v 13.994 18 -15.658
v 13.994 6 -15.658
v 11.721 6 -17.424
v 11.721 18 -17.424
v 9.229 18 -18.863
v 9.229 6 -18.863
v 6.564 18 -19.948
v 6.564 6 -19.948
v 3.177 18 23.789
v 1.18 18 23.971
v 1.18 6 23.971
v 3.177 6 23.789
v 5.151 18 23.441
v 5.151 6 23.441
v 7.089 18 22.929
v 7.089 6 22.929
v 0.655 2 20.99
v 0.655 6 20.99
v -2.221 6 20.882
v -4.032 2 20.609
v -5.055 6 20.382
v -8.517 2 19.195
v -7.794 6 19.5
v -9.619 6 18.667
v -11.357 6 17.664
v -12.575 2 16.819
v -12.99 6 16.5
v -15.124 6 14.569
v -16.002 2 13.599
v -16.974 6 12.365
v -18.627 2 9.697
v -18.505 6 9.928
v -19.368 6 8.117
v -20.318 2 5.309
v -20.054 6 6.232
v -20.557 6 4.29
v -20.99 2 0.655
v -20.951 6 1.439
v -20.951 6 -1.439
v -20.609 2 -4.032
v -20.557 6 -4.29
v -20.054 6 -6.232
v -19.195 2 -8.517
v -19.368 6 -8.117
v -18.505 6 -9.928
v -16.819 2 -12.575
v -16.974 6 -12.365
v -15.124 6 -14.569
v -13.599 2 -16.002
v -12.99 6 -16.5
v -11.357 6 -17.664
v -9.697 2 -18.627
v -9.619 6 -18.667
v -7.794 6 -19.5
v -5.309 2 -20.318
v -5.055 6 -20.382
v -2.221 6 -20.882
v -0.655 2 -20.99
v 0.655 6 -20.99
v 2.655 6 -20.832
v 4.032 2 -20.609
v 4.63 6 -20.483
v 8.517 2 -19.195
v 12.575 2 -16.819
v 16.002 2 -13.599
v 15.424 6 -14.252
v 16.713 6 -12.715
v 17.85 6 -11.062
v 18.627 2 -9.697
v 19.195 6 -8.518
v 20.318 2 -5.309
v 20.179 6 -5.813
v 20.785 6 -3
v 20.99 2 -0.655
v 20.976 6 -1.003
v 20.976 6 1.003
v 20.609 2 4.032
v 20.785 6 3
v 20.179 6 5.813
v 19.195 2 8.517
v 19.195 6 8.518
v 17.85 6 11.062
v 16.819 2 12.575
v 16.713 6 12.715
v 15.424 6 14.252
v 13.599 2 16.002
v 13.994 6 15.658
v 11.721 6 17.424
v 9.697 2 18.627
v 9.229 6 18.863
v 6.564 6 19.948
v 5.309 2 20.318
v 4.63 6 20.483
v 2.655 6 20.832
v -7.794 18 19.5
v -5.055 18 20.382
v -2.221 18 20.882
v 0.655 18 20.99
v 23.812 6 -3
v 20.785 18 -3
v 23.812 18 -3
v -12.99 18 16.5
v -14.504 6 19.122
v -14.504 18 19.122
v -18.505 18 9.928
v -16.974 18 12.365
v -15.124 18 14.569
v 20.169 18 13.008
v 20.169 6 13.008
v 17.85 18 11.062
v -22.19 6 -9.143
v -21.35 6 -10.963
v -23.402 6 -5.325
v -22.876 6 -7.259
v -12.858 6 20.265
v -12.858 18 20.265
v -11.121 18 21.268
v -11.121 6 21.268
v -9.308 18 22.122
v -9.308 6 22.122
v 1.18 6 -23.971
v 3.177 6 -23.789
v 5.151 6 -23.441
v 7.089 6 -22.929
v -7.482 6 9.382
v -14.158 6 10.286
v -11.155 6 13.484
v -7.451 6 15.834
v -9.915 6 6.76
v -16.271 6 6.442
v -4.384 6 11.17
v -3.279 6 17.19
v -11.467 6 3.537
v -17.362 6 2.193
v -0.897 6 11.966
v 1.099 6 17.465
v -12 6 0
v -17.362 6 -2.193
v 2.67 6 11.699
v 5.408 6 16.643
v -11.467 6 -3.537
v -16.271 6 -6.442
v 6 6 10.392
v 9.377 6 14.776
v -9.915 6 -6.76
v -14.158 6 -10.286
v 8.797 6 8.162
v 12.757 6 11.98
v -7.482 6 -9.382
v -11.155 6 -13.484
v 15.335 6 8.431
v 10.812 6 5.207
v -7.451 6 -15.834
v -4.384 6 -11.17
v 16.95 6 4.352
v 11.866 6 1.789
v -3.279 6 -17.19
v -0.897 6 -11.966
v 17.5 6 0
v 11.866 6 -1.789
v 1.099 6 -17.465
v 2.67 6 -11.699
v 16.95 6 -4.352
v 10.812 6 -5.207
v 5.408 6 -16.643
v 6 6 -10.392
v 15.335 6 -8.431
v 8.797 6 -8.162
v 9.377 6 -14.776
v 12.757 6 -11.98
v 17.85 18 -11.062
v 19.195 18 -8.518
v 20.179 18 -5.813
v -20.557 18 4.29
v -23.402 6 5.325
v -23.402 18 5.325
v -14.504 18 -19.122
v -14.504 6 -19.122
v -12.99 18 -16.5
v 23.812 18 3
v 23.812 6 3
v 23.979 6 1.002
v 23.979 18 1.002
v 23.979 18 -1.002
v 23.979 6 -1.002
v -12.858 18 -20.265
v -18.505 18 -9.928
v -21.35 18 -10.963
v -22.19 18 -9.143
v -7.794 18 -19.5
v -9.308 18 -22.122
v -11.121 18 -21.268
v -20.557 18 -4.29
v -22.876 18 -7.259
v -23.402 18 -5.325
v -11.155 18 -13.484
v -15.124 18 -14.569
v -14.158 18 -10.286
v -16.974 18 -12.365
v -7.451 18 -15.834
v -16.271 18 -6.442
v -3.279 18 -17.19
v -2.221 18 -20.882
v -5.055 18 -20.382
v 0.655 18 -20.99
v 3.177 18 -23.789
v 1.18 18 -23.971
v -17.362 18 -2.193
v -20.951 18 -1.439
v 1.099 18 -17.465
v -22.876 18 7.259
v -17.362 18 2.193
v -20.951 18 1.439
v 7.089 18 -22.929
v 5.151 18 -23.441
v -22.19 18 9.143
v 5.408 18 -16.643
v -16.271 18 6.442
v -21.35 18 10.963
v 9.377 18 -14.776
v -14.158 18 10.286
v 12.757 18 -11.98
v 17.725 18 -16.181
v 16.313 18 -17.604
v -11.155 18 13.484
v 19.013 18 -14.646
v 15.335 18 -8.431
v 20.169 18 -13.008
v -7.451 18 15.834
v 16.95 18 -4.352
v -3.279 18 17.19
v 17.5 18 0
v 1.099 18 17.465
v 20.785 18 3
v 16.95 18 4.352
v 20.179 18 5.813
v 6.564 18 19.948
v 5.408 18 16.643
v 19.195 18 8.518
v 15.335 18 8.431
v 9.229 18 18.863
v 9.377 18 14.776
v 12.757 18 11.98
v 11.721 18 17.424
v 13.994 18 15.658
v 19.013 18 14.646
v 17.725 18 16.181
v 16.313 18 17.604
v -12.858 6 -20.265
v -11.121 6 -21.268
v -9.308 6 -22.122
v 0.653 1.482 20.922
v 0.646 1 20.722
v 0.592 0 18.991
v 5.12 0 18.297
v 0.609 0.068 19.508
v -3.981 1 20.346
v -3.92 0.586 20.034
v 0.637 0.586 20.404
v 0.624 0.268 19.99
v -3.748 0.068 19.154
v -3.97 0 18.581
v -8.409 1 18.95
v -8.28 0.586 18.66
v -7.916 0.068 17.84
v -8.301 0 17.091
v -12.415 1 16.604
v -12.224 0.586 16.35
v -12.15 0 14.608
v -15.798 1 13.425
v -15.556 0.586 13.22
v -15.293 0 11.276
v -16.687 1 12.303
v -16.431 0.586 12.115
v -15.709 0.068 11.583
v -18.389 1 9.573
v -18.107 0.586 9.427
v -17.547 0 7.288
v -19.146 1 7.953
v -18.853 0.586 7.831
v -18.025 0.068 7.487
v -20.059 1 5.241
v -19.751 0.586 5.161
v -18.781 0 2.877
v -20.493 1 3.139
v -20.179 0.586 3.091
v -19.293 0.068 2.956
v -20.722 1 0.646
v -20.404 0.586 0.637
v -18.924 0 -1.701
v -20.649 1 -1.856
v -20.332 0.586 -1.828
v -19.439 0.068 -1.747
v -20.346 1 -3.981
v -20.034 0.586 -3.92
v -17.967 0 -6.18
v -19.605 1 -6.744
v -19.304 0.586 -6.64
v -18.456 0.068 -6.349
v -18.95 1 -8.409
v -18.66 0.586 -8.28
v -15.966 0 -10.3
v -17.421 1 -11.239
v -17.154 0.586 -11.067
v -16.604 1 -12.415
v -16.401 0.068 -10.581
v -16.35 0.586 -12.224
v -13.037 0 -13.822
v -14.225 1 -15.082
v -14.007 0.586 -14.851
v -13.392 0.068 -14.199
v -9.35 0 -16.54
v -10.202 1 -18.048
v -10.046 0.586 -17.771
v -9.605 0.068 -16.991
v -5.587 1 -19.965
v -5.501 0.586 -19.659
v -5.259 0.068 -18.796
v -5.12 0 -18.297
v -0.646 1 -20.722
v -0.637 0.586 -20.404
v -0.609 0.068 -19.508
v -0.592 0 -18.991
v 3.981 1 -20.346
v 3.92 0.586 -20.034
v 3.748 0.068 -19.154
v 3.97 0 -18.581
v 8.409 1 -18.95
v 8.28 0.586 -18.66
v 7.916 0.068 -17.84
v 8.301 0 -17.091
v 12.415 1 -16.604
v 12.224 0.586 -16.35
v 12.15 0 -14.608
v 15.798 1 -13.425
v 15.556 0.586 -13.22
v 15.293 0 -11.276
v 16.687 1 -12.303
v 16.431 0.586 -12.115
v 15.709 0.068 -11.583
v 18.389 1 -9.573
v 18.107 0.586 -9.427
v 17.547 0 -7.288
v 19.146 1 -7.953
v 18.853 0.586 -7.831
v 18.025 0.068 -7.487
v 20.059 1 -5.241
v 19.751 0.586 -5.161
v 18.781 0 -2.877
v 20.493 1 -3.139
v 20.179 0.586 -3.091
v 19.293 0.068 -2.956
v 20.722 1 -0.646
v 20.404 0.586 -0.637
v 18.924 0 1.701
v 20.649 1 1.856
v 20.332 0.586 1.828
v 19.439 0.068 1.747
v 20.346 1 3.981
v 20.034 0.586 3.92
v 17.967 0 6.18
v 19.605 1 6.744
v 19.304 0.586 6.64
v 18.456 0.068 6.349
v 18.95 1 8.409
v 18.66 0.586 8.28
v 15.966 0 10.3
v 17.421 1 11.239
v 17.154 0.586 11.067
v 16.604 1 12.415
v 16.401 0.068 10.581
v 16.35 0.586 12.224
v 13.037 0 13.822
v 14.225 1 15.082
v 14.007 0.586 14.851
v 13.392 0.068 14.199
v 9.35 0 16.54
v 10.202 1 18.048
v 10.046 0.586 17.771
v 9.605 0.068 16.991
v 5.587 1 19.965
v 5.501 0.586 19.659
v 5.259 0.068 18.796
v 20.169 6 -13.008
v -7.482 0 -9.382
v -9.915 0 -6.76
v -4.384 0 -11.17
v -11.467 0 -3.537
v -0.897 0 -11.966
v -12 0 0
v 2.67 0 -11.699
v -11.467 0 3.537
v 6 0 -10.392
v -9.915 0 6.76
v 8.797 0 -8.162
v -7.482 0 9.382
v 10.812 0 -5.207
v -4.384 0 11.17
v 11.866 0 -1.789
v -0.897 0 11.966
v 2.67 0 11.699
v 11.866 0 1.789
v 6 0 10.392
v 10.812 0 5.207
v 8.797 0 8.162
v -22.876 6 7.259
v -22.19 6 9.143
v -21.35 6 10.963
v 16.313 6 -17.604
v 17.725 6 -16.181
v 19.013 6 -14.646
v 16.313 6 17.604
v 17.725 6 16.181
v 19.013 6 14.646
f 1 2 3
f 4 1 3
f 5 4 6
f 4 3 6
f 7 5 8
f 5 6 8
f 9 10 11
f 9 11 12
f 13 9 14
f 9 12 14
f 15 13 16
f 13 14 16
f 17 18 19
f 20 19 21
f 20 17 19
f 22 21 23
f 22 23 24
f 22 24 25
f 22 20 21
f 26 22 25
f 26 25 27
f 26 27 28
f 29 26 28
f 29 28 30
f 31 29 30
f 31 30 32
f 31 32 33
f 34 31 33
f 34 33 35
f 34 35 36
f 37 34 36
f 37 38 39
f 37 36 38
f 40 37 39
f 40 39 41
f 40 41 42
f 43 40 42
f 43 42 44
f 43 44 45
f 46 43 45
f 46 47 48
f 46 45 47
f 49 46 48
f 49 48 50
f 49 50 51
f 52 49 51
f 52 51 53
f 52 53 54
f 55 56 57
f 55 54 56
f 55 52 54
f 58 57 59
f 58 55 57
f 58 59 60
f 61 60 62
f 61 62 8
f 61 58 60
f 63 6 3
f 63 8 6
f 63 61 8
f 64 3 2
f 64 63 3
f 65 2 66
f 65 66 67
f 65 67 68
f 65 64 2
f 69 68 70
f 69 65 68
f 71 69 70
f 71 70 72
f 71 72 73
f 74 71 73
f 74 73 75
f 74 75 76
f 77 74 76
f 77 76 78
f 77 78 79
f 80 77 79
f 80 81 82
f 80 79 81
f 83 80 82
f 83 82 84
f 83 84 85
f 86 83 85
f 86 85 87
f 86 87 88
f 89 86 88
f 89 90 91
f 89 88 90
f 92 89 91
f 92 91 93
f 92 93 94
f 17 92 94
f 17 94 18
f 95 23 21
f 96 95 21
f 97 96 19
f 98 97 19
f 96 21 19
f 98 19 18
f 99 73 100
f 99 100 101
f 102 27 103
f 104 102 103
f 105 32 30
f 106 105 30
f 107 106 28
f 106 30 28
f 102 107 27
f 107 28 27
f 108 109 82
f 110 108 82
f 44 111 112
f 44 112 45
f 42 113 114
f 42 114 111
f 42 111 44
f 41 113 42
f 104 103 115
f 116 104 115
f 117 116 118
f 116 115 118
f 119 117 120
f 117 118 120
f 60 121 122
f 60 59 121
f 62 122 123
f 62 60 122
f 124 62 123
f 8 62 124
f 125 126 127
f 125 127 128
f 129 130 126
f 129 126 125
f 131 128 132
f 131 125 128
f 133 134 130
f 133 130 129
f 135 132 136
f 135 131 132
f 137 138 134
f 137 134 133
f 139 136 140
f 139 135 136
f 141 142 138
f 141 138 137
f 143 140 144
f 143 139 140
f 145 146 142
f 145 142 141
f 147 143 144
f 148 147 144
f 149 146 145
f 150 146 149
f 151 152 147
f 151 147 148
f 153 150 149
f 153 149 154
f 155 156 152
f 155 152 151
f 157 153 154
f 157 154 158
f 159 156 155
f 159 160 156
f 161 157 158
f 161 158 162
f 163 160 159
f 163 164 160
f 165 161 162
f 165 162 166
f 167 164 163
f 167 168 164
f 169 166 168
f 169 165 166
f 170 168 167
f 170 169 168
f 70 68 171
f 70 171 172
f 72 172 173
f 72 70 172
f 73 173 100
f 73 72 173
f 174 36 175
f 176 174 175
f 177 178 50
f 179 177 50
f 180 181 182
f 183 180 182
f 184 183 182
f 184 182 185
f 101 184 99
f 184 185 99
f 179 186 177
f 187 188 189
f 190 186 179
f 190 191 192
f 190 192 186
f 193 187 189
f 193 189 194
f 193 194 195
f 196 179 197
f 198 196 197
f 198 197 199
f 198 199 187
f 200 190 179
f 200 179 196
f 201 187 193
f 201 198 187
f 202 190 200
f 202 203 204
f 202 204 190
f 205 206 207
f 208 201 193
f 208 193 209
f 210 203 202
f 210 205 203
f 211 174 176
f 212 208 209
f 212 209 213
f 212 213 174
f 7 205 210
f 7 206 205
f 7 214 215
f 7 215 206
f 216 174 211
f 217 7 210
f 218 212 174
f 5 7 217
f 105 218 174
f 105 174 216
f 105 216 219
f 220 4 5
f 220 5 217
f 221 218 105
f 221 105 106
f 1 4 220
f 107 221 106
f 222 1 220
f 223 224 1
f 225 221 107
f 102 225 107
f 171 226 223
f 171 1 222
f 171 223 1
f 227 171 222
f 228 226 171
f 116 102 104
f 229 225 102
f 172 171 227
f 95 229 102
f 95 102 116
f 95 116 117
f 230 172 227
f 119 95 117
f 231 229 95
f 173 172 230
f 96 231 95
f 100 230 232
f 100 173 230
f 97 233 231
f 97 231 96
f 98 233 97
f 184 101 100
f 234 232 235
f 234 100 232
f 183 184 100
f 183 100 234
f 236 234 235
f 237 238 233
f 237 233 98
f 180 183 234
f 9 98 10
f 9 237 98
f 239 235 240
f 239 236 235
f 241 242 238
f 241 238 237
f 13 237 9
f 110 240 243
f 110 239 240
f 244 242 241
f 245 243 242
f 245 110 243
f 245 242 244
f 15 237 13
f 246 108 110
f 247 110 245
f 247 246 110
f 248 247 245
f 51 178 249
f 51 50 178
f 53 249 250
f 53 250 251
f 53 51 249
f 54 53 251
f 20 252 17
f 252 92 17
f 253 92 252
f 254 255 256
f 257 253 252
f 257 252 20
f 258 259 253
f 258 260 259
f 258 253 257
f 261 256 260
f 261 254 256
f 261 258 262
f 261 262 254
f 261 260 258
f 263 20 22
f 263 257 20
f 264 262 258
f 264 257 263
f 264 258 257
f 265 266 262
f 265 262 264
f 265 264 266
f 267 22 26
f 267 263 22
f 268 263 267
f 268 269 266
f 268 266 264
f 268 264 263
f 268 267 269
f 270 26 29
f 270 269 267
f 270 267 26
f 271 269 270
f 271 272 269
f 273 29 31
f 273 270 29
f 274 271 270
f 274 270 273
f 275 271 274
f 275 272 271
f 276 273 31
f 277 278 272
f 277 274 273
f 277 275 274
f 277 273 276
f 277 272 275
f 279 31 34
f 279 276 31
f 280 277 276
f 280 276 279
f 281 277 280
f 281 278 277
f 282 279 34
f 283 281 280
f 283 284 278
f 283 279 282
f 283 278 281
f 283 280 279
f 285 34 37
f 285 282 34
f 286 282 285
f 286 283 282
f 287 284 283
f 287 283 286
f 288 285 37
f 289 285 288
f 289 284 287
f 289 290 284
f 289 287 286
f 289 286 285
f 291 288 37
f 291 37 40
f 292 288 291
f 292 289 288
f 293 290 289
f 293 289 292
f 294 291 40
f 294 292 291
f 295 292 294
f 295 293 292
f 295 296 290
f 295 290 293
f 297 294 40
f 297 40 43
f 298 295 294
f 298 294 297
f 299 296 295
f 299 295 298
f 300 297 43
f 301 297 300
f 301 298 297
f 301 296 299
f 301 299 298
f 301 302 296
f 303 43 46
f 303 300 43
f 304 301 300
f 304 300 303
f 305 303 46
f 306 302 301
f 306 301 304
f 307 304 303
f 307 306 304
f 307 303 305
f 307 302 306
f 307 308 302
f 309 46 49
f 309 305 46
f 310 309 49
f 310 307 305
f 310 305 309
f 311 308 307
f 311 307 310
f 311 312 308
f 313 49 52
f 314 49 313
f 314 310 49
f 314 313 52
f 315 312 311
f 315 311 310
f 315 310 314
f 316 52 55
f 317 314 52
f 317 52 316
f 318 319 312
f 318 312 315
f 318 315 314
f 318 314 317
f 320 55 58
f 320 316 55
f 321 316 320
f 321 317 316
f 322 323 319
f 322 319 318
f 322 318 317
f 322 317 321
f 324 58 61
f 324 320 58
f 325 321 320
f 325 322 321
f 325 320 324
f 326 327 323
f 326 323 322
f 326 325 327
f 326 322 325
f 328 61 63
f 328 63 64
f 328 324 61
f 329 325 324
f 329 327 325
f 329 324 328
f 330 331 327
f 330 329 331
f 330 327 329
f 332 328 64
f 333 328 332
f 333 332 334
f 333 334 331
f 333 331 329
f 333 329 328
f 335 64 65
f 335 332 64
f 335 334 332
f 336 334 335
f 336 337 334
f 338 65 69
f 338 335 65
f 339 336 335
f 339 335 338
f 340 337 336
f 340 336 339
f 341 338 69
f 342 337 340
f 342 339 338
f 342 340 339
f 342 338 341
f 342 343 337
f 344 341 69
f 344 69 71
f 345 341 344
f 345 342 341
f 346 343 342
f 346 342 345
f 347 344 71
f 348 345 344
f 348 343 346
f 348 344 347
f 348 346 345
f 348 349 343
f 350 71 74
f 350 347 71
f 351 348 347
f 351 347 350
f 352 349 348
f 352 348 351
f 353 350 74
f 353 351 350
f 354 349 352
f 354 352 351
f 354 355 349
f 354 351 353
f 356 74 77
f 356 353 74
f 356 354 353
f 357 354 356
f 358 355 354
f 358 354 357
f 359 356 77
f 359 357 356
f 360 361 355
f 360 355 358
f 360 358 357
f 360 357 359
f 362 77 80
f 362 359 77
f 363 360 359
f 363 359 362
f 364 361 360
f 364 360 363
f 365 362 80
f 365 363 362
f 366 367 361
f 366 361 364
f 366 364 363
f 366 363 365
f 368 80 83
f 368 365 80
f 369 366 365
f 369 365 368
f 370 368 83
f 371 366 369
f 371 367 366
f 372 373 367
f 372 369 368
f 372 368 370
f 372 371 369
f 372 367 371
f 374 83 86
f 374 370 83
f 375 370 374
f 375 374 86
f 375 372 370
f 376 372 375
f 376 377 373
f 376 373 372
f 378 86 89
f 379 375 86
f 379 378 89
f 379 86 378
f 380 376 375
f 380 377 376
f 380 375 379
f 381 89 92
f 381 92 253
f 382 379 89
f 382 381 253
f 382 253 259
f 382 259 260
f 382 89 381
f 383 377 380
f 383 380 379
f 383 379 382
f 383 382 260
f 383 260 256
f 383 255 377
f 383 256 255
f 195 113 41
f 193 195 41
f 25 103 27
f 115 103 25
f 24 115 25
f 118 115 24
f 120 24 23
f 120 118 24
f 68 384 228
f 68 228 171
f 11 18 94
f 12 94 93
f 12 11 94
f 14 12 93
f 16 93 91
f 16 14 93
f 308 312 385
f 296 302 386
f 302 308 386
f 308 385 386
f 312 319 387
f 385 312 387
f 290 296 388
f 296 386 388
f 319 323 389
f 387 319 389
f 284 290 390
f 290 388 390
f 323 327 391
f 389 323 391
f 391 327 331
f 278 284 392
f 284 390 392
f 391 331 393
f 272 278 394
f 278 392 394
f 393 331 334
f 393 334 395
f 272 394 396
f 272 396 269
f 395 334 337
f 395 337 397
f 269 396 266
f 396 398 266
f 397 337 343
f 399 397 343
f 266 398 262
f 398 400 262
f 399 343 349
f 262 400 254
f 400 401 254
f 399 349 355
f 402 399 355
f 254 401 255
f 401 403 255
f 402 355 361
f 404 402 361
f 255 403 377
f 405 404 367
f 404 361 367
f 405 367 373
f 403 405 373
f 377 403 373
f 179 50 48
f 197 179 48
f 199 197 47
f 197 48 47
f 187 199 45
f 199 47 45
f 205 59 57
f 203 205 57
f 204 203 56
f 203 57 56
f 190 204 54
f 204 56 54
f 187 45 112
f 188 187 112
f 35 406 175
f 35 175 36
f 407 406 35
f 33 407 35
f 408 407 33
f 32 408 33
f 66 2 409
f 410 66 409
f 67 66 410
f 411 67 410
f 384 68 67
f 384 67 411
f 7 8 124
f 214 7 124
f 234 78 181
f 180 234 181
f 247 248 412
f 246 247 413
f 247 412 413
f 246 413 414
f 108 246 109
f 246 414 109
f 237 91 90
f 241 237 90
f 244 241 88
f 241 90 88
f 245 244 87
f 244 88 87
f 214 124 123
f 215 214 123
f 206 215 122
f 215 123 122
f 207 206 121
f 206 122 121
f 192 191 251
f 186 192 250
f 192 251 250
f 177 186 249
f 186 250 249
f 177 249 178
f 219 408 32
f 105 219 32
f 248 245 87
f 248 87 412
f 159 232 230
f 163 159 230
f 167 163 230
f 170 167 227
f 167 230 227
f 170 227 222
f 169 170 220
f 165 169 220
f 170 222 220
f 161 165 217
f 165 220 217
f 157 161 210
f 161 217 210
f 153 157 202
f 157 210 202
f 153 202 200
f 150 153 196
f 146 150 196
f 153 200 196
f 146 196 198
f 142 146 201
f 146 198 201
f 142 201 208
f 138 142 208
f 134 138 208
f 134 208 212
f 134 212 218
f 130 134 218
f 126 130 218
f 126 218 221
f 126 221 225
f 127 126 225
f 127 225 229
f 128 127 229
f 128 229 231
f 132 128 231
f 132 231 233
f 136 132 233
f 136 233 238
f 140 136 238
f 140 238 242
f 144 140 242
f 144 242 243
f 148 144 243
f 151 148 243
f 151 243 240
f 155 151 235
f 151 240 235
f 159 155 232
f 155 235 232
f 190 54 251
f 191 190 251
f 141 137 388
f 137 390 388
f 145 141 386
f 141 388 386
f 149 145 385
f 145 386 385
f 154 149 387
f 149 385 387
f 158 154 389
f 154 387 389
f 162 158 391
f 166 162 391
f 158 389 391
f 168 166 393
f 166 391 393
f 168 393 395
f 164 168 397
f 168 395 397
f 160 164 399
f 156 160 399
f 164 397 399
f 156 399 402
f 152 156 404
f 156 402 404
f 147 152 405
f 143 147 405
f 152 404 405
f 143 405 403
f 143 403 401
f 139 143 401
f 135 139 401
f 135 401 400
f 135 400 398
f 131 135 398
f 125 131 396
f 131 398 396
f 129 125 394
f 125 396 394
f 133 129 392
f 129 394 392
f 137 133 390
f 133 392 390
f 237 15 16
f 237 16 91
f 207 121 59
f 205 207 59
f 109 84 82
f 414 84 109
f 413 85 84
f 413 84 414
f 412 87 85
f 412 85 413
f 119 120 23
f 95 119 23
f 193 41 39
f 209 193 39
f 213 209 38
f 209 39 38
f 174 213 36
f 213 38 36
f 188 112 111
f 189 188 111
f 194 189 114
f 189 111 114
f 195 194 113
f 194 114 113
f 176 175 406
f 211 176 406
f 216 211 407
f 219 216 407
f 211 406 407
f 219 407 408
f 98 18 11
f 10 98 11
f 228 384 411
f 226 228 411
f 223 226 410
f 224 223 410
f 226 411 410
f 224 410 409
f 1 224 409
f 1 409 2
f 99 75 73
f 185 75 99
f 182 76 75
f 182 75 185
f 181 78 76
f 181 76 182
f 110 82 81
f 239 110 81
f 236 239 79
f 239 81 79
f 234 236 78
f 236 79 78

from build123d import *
from build123d.topology import SkipClean

# Parameters (mm, degrees)
SKETCH1_R           = 24
BOSS_EXTRUDE1_DEPTH = 18
HOLE2_D             = 24
HOLE2_DEPTH         = 18
HOLE2_CBORE_D       = 35
HOLE2_CBORE_DEPTH   = 12
HOLE2_TIP           = 7.210327428
CUT_EXTRUDE1_START  = -12
CUT_EXTRUDE1_DEPTH  = 12
SKETCH7_R           = 24
SKETCH7_R_2         = 21
CUT_EXTRUDE2_DEPTH  = 6
FILLET1_R           = 2


with BuildPart() as part:
    # Sketch1 → Boss-Extrude1 (new body)
    with BuildSketch(Plane(origin=(0, 0, 0), x_dir=(1, 0, 0), z_dir=(0, 1, 0))):
        with Locations(Location((0, 0, 0), (0, 0, 270))):
            Circle(SKETCH1_R)
    extrude(amount=BOSS_EXTRUDE1_DEPTH)

    # Hole2
    with Locations(Plane(origin=(0, 18, 0), x_dir=(1, 0, 0), z_dir=(0, 1, 0))):
        with Locations((0, 0)):
            CounterBoreHole(HOLE2_D / 2, HOLE2_CBORE_D / 2, HOLE2_CBORE_DEPTH, depth=HOLE2_DEPTH)
            with Locations((0, 0, -(HOLE2_DEPTH + HOLE2_TIP / 2))):  # 118° drill point
                Cone(0, HOLE2_D / 2, HOLE2_TIP, mode=Mode.SUBTRACT)

    # Sketch6 → Cut-Extrude1 (cut)
    with BuildSketch(Plane(origin=(0, 18, 0), x_dir=(1, 0, 0), z_dir=(0, 1, 0)).offset(CUT_EXTRUDE1_START)):
        with BuildLine():
            Line((20.784609691, 3), (23.8117618, 3))
            ThreePointArc((23.8117618, 3), (22.552622899, 8.20848344), (20.169230637, 13.00777212))
            Line((20.169230637, 13.00777212), (17.850297585, 11.061956252))
            ThreePointArc((17.850297585, 11.061956252), (19.733545037, 7.18242301), (20.784609691, 3))
        make_face()
        with BuildLine():
            Line((20.784609691, -3), (23.8117618, -3))
            ThreePointArc((23.8117618, -3), (22.552622899, -8.20848344), (20.169230637, -13.00777212))
            Line((20.169230637, -13.00777212), (17.850297585, -11.061956252))
            ThreePointArc((17.850297585, -11.061956252), (19.733545037, -7.18242301), (20.784609691, -3))
        make_face()
        with BuildLine():
            Line((13.993571927, -15.658222911), (16.312504978, -17.604038779))
            ThreePointArc((16.312504978, -17.604038779), (12, -20.784609691), (7.089292303, -22.9290631))
            Line((7.089292303, -22.9290631), (6.563632855, -19.947900234))
            ThreePointArc((6.563632855, -19.947900234), (10.5, -18.186533479), (13.993571927, -15.658222911))
        make_face()
        with BuildLine():
            Line((0.654786337, -20.9897893), (1.180445784, -23.970952166))
            ThreePointArc((1.180445784, -23.970952166), (-4.167556264, -23.635386072), (-9.307804688, -22.121590627))
            Line((-9.307804688, -22.121590627), (-7.794228634, -19.5))
            ThreePointArc((-7.794228634, -19.5), (-3.646611731, -20.680962813), (0.654786337, -20.9897893))
        make_face()
        with BuildLine():
            Line((-12.990381057, -16.5), (-14.503957111, -19.121590627))
            ThreePointArc((-14.503957111, -19.121590627), (-18.385066635, -15.426902632), (-21.349676421, -10.963180046))
            Line((-21.349676421, -10.963180046), (-18.505083922, -9.927833048))
            ThreePointArc((-18.505083922, -9.927833048), (-16.086933305, -13.498539803), (-12.990381057, -16.5))
        make_face()
        with BuildLine():
            Line((-20.557204782, -4.289677323), (-23.401797281, -5.325024321))
            ThreePointArc((-23.401797281, -5.325024321), (-24, 0), (-23.401797281, 5.325024321))
            Line((-23.401797281, 5.325024321), (-20.557204782, 4.289677323))
            ThreePointArc((-20.557204782, 4.289677323), (-21, 0), (-20.557204782, -4.289677323))
        make_face()
        with BuildLine():
            Line((-18.505083922, 9.927833048), (-21.349676421, 10.963180046))
            ThreePointArc((-21.349676421, 10.963180046), (-18.385066635, 15.426902632), (-14.503957111, 19.121590627))
            Line((-14.503957111, 19.121590627), (-12.990381057, 16.5))
            ThreePointArc((-12.990381057, 16.5), (-16.086933305, 13.498539803), (-18.505083922, 9.927833048))
        make_face()
        with BuildLine():
            Line((-7.794228634, 19.5), (-9.307804688, 22.121590627))
            ThreePointArc((-9.307804688, 22.121590627), (-4.167556264, 23.635386072), (1.180445784, 23.970952166))
            Line((1.180445784, 23.970952166), (0.654786337, 20.9897893))
            ThreePointArc((0.654786337, 20.9897893), (-3.646611731, 20.680962813), (-7.794228634, 19.5))
        make_face()
        with BuildLine():
            Line((6.563632855, 19.947900234), (7.089292303, 22.9290631))
            ThreePointArc((7.089292303, 22.9290631), (12, 20.784609691), (16.312504978, 17.604038779))
            Line((16.312504978, 17.604038779), (13.993571927, 15.658222911))
            ThreePointArc((13.993571927, 15.658222911), (10.5, 18.186533479), (6.563632855, 19.947900234))
        make_face()
    extrude(amount=CUT_EXTRUDE1_DEPTH, mode=Mode.SUBTRACT)

    # Sketch7 → Cut-Extrude2 (cut)
    with SkipClean():  # the faces are left unmerged after this step: merging them gives an invalid solid
        with BuildSketch(Plane.XZ):
            Circle(SKETCH7_R)
            with Locations(Location((0, 0, 0), (0, 0, 88.213210702))):
                Circle(SKETCH7_R_2, mode=Mode.SUBTRACT)
        extrude(amount=-CUT_EXTRUDE2_DEPTH, mode=Mode.SUBTRACT)

    # Fillet1
    fillet1_edges = [part.edges().sort_by_distance(p)[0] for p in [
        (-0.654786337, 0, -20.9897893),
    ]]
    fillet(fillet1_edges, radius=FILLET1_R)


solid = part.part
